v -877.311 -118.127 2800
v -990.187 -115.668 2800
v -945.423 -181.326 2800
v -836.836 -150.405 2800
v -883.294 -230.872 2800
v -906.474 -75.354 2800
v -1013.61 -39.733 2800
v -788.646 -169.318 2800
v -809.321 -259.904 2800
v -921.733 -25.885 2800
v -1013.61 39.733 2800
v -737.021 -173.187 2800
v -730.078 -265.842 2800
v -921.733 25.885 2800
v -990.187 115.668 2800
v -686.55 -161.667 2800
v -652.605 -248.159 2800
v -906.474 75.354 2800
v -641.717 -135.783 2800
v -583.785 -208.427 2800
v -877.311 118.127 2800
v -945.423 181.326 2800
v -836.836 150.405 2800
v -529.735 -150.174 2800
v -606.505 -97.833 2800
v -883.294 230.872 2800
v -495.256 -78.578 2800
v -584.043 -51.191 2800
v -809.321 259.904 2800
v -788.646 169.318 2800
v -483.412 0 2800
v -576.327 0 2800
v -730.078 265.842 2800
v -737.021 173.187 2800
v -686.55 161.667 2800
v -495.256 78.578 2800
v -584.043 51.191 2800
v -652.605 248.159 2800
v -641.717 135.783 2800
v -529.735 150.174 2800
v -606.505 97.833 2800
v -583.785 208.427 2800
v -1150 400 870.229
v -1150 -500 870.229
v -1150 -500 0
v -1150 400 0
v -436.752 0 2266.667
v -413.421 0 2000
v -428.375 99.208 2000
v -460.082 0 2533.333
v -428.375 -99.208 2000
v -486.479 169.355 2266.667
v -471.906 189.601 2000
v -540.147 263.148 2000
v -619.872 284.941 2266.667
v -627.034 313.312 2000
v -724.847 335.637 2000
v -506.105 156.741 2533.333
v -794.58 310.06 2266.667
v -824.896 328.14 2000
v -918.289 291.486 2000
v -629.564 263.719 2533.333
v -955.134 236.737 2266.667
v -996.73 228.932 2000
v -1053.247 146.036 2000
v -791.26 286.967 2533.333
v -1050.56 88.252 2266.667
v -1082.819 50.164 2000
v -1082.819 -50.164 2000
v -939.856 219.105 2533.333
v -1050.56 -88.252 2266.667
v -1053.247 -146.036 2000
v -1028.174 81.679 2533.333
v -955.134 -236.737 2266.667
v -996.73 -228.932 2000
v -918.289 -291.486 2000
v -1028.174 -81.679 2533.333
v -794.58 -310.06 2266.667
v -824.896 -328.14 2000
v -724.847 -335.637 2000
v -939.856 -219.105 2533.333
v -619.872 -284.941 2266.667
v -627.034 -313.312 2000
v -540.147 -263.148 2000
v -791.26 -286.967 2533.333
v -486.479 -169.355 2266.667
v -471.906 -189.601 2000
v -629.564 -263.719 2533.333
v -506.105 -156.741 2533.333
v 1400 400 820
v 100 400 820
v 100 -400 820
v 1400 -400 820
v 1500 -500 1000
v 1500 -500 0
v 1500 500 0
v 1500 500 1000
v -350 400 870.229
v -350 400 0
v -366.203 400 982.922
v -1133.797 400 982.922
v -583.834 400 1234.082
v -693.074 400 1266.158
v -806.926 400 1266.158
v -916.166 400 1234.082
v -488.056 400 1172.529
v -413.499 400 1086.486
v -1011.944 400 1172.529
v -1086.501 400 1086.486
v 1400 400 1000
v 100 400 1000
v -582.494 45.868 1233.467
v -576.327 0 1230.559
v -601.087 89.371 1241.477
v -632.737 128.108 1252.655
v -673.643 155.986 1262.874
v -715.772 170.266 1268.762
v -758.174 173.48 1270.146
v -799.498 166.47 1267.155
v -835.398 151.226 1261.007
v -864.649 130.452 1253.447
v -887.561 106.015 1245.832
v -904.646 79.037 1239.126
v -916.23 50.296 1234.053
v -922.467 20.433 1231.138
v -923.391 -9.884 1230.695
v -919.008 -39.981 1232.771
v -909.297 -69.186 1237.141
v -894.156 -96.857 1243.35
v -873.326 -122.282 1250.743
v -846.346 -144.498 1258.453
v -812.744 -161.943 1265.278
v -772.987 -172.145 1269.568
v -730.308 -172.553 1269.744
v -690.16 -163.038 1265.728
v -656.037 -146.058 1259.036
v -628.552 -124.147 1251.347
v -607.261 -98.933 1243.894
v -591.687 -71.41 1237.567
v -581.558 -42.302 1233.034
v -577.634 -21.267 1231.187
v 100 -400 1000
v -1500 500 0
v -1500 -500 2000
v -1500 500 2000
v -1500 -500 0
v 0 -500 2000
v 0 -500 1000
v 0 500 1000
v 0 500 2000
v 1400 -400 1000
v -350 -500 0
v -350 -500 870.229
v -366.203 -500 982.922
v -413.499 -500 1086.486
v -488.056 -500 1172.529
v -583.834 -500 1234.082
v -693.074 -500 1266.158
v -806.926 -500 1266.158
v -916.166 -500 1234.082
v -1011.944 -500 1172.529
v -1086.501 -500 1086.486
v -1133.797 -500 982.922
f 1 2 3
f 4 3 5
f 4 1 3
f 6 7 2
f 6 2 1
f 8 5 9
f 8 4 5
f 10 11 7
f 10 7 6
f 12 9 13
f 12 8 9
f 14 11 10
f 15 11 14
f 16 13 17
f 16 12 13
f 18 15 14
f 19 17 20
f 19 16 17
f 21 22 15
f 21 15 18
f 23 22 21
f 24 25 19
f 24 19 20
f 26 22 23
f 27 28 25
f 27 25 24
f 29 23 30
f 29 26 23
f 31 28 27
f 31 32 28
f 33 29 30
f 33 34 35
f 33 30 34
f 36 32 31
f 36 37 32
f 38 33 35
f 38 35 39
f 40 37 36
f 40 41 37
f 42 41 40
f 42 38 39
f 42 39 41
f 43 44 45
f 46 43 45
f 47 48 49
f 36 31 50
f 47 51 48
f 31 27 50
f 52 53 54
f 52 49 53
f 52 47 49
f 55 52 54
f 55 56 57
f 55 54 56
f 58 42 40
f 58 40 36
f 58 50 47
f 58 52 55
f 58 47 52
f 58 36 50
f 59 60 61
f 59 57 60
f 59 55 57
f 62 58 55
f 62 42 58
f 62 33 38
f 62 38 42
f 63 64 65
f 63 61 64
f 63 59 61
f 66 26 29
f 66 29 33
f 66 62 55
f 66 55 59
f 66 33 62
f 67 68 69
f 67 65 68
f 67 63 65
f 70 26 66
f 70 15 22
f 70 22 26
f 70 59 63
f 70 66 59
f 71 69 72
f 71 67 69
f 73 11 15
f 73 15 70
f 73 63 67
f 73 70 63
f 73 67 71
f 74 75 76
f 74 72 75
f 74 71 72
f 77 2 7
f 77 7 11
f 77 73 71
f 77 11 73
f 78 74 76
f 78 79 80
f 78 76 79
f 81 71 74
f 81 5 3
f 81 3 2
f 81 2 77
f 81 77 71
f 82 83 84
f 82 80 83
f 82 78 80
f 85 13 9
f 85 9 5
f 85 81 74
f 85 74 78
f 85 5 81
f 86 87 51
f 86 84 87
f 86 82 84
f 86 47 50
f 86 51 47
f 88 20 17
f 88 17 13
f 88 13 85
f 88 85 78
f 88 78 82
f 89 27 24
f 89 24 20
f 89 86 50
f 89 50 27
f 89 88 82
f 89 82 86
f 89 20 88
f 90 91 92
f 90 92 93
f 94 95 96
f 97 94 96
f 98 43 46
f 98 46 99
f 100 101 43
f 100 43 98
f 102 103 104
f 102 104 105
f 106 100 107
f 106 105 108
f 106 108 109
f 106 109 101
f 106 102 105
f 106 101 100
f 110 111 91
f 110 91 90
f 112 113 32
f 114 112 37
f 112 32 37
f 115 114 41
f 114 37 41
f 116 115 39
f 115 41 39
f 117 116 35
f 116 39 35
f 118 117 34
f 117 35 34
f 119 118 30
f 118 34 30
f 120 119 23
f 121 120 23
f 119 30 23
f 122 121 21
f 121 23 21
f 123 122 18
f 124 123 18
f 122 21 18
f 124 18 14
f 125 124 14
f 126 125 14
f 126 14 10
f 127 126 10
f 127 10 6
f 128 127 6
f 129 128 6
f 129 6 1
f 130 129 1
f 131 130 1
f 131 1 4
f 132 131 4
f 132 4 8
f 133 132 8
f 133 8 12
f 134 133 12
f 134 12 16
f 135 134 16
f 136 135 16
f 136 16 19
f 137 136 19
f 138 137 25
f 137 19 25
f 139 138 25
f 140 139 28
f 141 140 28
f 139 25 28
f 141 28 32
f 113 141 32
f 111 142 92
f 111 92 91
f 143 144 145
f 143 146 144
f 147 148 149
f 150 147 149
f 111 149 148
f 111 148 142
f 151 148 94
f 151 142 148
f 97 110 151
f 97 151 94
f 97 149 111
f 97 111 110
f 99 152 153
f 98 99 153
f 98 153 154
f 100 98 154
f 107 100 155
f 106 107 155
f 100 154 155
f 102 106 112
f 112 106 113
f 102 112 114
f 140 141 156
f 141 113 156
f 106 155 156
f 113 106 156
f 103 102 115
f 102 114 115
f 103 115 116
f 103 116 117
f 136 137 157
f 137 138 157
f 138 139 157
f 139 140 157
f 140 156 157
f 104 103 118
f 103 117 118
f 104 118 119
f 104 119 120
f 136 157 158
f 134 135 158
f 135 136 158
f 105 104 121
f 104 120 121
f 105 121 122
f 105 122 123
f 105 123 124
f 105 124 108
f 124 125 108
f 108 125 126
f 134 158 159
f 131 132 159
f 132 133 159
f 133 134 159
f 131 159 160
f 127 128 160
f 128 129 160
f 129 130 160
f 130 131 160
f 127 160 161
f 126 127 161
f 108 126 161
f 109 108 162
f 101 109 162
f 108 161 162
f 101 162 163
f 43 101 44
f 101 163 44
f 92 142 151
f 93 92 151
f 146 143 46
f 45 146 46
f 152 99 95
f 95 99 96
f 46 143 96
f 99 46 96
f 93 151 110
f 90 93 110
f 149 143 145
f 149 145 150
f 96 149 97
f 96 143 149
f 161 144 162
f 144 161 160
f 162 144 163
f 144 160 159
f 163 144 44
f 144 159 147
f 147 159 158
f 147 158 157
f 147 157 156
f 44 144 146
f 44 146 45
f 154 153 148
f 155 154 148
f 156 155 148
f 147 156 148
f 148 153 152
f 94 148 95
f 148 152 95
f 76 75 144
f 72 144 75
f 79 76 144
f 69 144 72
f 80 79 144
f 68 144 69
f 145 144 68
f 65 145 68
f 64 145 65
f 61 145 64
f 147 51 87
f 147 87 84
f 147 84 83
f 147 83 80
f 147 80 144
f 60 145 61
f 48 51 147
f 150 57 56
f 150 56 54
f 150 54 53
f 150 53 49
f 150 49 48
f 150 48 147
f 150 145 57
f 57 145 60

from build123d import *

# Parameters (mm, degrees)
F0_W      = 3000
F0_H      = 1000
F1_DEPTH  = 1000
F2_W      = 1500
F2_H      = 1000
F3_DEPTH  = 1000
F5_DEPTH  = 900
F6_W      = 1300
F6_H      = 800
F7_DEPTH  = 180
F8_R      = 336.5785790594
F9_DEPTH  = 800
F9_TAPER  = 5
F10_R     = 173.6727180738
F11_DEPTH = 2800.001


with BuildPart() as f1:
    # F0 (on Top) → F1 (new body)
    with BuildSketch(Plane.XY):
        Rectangle(F0_W, F0_H)
    extrude(amount=F1_DEPTH)

    # F2 (on face) → F3 (join)
    with BuildSketch(Plane.XY.offset(1000)):
        with Locations((-750, 0)):
            Rectangle(F2_W, F2_H)
    extrude(amount=F3_DEPTH)

    # F4 (on face) → F5 (cut)
    with BuildSketch(Plane.XZ.offset(500)):
        with BuildLine():
            Line((-1150, 870.2293634415), (-1150, 0))
            Line((-1150, 0), (-350, 0))
            Line((-350, 0), (-350, 870.2293634415))
            ThreePointArc((-350, 870.2293634415), (-750, 1270.2293634415), (-1150, 870.2293634415))
        make_face()
    extrude(amount=-F5_DEPTH, mode=Mode.SUBTRACT)

    # F6 (on face) → F7 (cut)
    with BuildSketch(Plane.XY.offset(1000)):
        with Locations((750, 0)):
            Rectangle(F6_W, F6_H)
    extrude(amount=-F7_DEPTH, mode=Mode.SUBTRACT)

    # F8 (on face) → F9 (join)
    with BuildSketch(Plane.XY.offset(2000)):
        with Locations((-750, 0)):
            Circle(F8_R)
    extrude(amount=F9_DEPTH, taper=F9_TAPER)

    # F10 (on face) → F11 (cut, through all)
    with BuildSketch(Plane.XY.offset(2800)):
        with Locations((-750, 0)):
            Circle(F10_R)
    extrude(amount=-F11_DEPTH, mode=Mode.SUBTRACT)


solid = f1.part
